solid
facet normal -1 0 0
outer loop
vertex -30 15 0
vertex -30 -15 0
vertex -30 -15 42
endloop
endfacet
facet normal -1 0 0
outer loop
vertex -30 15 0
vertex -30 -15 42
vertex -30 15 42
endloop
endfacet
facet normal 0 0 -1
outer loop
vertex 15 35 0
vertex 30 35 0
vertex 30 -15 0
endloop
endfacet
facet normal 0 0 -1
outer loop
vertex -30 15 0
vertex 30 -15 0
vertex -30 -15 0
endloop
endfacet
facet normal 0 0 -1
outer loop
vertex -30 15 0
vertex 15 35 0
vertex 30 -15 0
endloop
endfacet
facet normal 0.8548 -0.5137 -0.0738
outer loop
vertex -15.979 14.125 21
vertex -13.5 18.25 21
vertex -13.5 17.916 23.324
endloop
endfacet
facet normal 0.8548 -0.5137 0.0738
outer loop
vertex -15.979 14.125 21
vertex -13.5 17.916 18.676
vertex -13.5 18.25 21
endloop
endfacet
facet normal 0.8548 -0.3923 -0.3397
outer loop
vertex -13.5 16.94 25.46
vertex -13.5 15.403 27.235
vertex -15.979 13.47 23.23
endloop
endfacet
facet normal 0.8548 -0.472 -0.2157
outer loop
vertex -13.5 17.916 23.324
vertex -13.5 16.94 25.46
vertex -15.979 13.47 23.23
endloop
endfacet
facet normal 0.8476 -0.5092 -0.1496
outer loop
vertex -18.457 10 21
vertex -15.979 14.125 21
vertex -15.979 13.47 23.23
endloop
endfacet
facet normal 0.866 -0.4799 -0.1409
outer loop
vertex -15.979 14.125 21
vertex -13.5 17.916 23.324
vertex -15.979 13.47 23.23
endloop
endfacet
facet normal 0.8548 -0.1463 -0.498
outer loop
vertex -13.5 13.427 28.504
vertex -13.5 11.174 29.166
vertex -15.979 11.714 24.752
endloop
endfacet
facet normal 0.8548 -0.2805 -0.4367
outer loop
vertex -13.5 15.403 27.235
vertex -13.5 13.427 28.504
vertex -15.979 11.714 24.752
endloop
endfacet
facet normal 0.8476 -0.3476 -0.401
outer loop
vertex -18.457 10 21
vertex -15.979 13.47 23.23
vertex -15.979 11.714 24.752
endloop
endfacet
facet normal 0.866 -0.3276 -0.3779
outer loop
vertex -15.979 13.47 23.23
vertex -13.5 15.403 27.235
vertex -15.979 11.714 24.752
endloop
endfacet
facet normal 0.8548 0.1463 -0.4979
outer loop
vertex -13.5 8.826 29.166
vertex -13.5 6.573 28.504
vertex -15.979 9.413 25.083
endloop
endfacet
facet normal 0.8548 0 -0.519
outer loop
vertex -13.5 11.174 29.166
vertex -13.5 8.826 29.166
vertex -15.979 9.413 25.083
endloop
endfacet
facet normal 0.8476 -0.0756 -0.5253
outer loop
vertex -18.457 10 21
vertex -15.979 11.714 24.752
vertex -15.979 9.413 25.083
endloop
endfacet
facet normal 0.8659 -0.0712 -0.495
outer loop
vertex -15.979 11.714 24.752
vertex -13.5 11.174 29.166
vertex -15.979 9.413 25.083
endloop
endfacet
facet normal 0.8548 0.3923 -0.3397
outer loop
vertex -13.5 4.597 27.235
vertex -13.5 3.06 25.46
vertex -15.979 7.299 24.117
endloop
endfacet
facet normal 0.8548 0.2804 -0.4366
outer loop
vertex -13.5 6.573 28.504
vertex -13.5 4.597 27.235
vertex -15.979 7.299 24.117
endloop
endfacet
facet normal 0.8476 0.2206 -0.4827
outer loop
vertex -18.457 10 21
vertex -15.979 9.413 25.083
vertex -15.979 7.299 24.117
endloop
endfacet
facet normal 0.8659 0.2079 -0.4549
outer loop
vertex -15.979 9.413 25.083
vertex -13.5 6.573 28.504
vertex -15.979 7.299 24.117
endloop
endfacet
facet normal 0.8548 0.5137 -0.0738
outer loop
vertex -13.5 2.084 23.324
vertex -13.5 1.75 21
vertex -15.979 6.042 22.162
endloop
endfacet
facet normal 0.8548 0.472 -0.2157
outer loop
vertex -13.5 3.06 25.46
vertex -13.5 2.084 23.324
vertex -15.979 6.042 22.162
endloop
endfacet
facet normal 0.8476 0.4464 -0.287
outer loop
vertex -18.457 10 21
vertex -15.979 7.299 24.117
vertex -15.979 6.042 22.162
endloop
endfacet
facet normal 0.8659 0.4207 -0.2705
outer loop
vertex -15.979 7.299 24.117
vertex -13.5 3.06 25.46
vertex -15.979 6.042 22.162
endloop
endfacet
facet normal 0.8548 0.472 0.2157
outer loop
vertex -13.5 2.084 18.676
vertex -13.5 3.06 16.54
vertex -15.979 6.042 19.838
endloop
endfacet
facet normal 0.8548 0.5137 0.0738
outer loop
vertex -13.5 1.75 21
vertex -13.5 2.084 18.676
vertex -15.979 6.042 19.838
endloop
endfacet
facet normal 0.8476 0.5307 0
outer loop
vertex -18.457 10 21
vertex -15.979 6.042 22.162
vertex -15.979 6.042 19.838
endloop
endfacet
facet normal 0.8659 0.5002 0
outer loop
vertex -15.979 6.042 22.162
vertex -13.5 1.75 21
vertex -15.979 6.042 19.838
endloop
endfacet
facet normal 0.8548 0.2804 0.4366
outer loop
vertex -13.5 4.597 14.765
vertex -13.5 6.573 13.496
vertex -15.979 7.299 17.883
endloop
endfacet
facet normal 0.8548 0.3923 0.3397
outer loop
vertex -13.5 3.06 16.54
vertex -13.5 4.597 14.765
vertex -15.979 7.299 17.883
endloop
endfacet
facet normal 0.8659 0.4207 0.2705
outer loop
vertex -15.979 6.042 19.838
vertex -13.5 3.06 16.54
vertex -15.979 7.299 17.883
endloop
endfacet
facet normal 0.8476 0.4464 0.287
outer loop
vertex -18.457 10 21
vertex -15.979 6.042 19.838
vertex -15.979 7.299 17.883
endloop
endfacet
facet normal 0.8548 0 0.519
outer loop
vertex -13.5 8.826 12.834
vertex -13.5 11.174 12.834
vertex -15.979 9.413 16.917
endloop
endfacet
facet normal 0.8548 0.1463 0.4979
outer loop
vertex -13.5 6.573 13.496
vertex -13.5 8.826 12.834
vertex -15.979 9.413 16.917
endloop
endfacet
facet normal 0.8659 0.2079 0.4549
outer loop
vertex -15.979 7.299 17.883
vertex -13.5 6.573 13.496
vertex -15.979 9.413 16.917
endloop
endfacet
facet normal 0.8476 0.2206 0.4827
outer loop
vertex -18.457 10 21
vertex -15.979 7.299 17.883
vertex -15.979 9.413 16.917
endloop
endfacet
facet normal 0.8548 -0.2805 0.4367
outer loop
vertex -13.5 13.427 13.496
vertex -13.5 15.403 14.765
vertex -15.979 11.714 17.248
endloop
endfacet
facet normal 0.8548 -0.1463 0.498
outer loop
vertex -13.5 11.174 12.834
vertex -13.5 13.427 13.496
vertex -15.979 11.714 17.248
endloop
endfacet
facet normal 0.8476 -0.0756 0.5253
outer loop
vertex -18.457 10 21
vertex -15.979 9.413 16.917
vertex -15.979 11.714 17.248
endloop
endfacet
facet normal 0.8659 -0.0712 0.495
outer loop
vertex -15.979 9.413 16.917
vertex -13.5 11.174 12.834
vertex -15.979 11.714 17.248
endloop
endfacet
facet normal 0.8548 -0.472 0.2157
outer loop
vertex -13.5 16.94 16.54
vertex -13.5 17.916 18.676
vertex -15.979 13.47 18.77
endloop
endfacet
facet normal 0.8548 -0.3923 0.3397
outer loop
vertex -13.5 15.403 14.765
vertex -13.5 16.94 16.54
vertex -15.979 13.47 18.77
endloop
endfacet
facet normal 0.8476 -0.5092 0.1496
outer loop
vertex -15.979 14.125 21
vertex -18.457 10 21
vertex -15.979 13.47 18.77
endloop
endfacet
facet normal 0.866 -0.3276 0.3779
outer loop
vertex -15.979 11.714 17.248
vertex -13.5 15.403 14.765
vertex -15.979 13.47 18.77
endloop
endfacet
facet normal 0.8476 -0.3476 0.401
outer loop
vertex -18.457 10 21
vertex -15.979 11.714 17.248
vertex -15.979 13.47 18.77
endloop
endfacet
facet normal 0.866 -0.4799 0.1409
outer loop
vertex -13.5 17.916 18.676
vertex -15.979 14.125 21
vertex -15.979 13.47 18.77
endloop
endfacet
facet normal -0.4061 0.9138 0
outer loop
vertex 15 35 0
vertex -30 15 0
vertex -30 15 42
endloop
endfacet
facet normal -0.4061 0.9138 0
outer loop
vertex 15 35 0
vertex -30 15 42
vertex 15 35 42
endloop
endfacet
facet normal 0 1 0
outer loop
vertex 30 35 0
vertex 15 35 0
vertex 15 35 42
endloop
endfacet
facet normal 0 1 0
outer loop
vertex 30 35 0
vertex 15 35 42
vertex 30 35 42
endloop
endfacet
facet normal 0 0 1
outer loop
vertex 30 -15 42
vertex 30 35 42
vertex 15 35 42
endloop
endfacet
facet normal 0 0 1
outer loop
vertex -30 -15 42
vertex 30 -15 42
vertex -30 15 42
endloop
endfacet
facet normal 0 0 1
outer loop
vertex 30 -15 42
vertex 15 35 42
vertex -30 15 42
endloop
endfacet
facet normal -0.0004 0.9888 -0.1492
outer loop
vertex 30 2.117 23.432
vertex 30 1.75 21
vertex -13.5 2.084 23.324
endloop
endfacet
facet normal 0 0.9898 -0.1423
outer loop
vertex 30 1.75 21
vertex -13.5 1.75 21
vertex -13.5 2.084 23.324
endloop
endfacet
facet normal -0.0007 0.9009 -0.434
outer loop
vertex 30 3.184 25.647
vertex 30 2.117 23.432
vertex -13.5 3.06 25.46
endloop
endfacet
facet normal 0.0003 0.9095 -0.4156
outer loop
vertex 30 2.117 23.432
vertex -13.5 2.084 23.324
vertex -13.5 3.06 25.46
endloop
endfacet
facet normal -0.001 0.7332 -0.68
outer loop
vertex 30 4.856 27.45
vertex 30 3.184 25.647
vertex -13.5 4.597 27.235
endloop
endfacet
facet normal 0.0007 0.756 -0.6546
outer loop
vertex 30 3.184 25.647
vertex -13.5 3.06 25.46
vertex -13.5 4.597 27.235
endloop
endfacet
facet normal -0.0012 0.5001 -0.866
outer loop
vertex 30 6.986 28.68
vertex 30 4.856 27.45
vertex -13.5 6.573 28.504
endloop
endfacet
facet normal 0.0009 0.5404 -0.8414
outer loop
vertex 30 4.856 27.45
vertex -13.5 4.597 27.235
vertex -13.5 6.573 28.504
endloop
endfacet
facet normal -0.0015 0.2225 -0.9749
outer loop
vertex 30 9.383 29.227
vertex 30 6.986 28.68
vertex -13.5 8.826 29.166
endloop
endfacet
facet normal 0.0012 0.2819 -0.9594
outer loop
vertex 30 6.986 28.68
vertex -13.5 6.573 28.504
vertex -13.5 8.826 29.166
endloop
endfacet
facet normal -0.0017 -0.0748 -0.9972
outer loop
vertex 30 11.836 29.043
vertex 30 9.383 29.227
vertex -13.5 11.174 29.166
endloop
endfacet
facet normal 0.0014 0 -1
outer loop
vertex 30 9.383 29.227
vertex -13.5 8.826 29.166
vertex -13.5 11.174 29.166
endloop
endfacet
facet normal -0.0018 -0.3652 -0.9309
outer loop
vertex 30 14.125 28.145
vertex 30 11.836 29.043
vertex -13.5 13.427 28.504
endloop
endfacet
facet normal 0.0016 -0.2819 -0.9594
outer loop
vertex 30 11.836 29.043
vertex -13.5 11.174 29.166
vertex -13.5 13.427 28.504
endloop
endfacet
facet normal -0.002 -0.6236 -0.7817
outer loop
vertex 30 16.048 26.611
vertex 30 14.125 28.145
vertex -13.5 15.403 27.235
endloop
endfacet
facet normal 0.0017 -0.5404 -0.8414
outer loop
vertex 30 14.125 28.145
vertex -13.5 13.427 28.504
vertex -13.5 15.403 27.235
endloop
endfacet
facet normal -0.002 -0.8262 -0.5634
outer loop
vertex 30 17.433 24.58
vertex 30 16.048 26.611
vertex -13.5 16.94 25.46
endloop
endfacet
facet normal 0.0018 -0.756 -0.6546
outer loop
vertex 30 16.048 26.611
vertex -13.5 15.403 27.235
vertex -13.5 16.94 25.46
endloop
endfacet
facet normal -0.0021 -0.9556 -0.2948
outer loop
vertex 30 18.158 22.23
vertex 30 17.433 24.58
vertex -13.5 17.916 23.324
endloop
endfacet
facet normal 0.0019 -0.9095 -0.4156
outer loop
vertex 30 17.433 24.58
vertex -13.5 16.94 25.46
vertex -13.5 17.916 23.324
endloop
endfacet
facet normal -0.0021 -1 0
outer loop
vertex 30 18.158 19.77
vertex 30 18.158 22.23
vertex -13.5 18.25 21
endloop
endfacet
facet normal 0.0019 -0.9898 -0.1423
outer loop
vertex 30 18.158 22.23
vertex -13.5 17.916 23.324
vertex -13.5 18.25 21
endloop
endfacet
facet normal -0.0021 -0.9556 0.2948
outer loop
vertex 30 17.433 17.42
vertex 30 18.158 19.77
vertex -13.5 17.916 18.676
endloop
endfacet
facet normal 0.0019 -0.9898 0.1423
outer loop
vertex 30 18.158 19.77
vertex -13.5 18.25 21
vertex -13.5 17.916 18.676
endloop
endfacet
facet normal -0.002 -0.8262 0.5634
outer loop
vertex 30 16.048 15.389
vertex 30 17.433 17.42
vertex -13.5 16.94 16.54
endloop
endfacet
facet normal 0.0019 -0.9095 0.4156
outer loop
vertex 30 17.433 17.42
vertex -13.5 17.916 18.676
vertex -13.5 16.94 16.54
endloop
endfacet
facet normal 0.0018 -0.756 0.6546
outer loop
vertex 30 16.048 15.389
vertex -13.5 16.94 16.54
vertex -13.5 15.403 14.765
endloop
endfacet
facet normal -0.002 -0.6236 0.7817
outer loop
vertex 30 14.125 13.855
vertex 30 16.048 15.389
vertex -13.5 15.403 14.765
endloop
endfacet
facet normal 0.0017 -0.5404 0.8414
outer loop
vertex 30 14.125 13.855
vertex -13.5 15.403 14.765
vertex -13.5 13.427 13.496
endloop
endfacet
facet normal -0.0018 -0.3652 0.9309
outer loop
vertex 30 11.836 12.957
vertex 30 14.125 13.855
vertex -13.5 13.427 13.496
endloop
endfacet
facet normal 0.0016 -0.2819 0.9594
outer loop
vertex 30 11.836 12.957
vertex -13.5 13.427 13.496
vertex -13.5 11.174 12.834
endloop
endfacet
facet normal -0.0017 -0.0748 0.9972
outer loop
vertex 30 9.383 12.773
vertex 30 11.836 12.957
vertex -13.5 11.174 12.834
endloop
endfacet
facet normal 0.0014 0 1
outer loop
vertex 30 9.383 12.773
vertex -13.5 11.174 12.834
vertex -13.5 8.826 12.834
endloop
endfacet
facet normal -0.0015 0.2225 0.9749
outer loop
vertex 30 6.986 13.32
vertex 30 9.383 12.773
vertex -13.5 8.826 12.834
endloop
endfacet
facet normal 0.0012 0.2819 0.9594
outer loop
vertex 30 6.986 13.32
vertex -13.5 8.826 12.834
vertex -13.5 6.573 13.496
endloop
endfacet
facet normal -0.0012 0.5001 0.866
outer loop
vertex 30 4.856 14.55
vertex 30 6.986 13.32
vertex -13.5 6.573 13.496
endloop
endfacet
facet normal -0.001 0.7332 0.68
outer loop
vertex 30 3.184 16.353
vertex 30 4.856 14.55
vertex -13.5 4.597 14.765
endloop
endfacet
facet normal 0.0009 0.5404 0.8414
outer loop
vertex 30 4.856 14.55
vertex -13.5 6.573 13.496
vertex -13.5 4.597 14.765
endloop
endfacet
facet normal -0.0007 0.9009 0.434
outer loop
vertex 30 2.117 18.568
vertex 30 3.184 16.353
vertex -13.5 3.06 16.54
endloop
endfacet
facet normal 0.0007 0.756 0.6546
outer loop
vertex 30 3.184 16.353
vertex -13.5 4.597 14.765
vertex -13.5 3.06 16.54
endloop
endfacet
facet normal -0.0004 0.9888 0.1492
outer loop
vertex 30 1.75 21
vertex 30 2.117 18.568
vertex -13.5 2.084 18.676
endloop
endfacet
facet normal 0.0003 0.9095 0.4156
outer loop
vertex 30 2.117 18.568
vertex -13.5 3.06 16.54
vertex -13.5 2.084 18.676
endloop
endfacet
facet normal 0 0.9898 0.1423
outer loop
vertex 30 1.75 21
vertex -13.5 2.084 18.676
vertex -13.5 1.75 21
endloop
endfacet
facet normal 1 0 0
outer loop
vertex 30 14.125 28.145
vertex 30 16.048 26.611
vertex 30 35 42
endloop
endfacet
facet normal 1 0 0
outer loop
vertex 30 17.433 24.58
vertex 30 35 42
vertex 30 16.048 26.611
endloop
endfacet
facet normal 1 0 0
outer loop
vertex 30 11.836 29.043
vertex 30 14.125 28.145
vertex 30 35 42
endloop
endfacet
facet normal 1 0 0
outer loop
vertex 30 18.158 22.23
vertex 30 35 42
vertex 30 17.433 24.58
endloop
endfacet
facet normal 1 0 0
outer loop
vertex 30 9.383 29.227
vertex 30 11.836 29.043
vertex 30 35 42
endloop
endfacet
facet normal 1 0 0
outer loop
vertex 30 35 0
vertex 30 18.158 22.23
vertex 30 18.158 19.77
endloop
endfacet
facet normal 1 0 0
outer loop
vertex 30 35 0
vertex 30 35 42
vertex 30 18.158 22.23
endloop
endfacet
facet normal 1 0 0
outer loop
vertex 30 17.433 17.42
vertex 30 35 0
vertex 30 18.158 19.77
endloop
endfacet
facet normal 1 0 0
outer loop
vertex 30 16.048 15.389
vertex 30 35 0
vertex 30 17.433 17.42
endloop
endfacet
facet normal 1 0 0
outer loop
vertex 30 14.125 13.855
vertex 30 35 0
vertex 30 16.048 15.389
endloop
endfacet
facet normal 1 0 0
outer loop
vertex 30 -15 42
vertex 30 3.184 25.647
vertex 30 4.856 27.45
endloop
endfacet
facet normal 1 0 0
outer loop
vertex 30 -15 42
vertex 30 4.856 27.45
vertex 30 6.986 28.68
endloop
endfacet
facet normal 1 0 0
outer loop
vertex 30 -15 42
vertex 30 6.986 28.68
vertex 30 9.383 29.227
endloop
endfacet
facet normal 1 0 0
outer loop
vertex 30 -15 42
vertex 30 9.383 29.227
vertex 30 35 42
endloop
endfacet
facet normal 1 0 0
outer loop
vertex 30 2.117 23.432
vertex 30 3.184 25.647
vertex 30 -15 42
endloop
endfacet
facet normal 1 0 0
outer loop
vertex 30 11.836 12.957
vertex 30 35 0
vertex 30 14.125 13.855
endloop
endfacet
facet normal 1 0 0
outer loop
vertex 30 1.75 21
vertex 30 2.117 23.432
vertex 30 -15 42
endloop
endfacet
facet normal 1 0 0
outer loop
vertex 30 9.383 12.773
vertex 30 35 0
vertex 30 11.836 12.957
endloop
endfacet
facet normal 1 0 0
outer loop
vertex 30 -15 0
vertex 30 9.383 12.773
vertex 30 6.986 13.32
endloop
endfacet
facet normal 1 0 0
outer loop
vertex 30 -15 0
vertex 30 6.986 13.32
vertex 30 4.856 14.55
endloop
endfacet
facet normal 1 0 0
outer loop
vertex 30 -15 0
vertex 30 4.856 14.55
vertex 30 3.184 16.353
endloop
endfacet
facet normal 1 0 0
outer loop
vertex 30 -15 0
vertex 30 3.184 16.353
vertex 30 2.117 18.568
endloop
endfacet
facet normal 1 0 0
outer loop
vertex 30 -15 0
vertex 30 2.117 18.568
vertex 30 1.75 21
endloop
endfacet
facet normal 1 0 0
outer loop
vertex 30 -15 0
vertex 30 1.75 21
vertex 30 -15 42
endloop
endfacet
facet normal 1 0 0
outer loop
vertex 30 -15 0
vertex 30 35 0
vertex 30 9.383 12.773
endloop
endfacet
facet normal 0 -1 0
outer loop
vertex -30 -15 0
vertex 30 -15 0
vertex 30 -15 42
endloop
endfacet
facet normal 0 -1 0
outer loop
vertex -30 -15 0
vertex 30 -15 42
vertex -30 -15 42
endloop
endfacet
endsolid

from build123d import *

# Parameters (mm, degrees)
BOSS_EXTRUDE1_DEPTH        = 42
M18X1_5_TAPPED_HOLE1_D     = 16.5
M18X1_5_TAPPED_HOLE1_DEPTH = 43.5
M18X1_5_TAPPED_HOLE1_TIP   = 4.957100107


with BuildPart() as part:
    # Sketch1 → Boss-Extrude1 (new body)
    with BuildSketch(Plane.XY):
        Polygon((-30, 15), (15, 35), (30, 35), (30, -15), (-30, -15), align=None)
    extrude(amount=BOSS_EXTRUDE1_DEPTH)

    # M18x1.5 Tapped Hole1
    with Locations(Plane(origin=(30, 10, 21), x_dir=(0, 1, 0), z_dir=(1, 0, 0))):
        with Locations((0, 0)):
            Hole(M18X1_5_TAPPED_HOLE1_D / 2, depth=M18X1_5_TAPPED_HOLE1_DEPTH)
            with Locations((0, 0, -(M18X1_5_TAPPED_HOLE1_DEPTH + M18X1_5_TAPPED_HOLE1_TIP / 2))):  # 118° drill point
                Cone(0, M18X1_5_TAPPED_HOLE1_D / 2, M18X1_5_TAPPED_HOLE1_TIP, mode=Mode.SUBTRACT)


solid = part.part
